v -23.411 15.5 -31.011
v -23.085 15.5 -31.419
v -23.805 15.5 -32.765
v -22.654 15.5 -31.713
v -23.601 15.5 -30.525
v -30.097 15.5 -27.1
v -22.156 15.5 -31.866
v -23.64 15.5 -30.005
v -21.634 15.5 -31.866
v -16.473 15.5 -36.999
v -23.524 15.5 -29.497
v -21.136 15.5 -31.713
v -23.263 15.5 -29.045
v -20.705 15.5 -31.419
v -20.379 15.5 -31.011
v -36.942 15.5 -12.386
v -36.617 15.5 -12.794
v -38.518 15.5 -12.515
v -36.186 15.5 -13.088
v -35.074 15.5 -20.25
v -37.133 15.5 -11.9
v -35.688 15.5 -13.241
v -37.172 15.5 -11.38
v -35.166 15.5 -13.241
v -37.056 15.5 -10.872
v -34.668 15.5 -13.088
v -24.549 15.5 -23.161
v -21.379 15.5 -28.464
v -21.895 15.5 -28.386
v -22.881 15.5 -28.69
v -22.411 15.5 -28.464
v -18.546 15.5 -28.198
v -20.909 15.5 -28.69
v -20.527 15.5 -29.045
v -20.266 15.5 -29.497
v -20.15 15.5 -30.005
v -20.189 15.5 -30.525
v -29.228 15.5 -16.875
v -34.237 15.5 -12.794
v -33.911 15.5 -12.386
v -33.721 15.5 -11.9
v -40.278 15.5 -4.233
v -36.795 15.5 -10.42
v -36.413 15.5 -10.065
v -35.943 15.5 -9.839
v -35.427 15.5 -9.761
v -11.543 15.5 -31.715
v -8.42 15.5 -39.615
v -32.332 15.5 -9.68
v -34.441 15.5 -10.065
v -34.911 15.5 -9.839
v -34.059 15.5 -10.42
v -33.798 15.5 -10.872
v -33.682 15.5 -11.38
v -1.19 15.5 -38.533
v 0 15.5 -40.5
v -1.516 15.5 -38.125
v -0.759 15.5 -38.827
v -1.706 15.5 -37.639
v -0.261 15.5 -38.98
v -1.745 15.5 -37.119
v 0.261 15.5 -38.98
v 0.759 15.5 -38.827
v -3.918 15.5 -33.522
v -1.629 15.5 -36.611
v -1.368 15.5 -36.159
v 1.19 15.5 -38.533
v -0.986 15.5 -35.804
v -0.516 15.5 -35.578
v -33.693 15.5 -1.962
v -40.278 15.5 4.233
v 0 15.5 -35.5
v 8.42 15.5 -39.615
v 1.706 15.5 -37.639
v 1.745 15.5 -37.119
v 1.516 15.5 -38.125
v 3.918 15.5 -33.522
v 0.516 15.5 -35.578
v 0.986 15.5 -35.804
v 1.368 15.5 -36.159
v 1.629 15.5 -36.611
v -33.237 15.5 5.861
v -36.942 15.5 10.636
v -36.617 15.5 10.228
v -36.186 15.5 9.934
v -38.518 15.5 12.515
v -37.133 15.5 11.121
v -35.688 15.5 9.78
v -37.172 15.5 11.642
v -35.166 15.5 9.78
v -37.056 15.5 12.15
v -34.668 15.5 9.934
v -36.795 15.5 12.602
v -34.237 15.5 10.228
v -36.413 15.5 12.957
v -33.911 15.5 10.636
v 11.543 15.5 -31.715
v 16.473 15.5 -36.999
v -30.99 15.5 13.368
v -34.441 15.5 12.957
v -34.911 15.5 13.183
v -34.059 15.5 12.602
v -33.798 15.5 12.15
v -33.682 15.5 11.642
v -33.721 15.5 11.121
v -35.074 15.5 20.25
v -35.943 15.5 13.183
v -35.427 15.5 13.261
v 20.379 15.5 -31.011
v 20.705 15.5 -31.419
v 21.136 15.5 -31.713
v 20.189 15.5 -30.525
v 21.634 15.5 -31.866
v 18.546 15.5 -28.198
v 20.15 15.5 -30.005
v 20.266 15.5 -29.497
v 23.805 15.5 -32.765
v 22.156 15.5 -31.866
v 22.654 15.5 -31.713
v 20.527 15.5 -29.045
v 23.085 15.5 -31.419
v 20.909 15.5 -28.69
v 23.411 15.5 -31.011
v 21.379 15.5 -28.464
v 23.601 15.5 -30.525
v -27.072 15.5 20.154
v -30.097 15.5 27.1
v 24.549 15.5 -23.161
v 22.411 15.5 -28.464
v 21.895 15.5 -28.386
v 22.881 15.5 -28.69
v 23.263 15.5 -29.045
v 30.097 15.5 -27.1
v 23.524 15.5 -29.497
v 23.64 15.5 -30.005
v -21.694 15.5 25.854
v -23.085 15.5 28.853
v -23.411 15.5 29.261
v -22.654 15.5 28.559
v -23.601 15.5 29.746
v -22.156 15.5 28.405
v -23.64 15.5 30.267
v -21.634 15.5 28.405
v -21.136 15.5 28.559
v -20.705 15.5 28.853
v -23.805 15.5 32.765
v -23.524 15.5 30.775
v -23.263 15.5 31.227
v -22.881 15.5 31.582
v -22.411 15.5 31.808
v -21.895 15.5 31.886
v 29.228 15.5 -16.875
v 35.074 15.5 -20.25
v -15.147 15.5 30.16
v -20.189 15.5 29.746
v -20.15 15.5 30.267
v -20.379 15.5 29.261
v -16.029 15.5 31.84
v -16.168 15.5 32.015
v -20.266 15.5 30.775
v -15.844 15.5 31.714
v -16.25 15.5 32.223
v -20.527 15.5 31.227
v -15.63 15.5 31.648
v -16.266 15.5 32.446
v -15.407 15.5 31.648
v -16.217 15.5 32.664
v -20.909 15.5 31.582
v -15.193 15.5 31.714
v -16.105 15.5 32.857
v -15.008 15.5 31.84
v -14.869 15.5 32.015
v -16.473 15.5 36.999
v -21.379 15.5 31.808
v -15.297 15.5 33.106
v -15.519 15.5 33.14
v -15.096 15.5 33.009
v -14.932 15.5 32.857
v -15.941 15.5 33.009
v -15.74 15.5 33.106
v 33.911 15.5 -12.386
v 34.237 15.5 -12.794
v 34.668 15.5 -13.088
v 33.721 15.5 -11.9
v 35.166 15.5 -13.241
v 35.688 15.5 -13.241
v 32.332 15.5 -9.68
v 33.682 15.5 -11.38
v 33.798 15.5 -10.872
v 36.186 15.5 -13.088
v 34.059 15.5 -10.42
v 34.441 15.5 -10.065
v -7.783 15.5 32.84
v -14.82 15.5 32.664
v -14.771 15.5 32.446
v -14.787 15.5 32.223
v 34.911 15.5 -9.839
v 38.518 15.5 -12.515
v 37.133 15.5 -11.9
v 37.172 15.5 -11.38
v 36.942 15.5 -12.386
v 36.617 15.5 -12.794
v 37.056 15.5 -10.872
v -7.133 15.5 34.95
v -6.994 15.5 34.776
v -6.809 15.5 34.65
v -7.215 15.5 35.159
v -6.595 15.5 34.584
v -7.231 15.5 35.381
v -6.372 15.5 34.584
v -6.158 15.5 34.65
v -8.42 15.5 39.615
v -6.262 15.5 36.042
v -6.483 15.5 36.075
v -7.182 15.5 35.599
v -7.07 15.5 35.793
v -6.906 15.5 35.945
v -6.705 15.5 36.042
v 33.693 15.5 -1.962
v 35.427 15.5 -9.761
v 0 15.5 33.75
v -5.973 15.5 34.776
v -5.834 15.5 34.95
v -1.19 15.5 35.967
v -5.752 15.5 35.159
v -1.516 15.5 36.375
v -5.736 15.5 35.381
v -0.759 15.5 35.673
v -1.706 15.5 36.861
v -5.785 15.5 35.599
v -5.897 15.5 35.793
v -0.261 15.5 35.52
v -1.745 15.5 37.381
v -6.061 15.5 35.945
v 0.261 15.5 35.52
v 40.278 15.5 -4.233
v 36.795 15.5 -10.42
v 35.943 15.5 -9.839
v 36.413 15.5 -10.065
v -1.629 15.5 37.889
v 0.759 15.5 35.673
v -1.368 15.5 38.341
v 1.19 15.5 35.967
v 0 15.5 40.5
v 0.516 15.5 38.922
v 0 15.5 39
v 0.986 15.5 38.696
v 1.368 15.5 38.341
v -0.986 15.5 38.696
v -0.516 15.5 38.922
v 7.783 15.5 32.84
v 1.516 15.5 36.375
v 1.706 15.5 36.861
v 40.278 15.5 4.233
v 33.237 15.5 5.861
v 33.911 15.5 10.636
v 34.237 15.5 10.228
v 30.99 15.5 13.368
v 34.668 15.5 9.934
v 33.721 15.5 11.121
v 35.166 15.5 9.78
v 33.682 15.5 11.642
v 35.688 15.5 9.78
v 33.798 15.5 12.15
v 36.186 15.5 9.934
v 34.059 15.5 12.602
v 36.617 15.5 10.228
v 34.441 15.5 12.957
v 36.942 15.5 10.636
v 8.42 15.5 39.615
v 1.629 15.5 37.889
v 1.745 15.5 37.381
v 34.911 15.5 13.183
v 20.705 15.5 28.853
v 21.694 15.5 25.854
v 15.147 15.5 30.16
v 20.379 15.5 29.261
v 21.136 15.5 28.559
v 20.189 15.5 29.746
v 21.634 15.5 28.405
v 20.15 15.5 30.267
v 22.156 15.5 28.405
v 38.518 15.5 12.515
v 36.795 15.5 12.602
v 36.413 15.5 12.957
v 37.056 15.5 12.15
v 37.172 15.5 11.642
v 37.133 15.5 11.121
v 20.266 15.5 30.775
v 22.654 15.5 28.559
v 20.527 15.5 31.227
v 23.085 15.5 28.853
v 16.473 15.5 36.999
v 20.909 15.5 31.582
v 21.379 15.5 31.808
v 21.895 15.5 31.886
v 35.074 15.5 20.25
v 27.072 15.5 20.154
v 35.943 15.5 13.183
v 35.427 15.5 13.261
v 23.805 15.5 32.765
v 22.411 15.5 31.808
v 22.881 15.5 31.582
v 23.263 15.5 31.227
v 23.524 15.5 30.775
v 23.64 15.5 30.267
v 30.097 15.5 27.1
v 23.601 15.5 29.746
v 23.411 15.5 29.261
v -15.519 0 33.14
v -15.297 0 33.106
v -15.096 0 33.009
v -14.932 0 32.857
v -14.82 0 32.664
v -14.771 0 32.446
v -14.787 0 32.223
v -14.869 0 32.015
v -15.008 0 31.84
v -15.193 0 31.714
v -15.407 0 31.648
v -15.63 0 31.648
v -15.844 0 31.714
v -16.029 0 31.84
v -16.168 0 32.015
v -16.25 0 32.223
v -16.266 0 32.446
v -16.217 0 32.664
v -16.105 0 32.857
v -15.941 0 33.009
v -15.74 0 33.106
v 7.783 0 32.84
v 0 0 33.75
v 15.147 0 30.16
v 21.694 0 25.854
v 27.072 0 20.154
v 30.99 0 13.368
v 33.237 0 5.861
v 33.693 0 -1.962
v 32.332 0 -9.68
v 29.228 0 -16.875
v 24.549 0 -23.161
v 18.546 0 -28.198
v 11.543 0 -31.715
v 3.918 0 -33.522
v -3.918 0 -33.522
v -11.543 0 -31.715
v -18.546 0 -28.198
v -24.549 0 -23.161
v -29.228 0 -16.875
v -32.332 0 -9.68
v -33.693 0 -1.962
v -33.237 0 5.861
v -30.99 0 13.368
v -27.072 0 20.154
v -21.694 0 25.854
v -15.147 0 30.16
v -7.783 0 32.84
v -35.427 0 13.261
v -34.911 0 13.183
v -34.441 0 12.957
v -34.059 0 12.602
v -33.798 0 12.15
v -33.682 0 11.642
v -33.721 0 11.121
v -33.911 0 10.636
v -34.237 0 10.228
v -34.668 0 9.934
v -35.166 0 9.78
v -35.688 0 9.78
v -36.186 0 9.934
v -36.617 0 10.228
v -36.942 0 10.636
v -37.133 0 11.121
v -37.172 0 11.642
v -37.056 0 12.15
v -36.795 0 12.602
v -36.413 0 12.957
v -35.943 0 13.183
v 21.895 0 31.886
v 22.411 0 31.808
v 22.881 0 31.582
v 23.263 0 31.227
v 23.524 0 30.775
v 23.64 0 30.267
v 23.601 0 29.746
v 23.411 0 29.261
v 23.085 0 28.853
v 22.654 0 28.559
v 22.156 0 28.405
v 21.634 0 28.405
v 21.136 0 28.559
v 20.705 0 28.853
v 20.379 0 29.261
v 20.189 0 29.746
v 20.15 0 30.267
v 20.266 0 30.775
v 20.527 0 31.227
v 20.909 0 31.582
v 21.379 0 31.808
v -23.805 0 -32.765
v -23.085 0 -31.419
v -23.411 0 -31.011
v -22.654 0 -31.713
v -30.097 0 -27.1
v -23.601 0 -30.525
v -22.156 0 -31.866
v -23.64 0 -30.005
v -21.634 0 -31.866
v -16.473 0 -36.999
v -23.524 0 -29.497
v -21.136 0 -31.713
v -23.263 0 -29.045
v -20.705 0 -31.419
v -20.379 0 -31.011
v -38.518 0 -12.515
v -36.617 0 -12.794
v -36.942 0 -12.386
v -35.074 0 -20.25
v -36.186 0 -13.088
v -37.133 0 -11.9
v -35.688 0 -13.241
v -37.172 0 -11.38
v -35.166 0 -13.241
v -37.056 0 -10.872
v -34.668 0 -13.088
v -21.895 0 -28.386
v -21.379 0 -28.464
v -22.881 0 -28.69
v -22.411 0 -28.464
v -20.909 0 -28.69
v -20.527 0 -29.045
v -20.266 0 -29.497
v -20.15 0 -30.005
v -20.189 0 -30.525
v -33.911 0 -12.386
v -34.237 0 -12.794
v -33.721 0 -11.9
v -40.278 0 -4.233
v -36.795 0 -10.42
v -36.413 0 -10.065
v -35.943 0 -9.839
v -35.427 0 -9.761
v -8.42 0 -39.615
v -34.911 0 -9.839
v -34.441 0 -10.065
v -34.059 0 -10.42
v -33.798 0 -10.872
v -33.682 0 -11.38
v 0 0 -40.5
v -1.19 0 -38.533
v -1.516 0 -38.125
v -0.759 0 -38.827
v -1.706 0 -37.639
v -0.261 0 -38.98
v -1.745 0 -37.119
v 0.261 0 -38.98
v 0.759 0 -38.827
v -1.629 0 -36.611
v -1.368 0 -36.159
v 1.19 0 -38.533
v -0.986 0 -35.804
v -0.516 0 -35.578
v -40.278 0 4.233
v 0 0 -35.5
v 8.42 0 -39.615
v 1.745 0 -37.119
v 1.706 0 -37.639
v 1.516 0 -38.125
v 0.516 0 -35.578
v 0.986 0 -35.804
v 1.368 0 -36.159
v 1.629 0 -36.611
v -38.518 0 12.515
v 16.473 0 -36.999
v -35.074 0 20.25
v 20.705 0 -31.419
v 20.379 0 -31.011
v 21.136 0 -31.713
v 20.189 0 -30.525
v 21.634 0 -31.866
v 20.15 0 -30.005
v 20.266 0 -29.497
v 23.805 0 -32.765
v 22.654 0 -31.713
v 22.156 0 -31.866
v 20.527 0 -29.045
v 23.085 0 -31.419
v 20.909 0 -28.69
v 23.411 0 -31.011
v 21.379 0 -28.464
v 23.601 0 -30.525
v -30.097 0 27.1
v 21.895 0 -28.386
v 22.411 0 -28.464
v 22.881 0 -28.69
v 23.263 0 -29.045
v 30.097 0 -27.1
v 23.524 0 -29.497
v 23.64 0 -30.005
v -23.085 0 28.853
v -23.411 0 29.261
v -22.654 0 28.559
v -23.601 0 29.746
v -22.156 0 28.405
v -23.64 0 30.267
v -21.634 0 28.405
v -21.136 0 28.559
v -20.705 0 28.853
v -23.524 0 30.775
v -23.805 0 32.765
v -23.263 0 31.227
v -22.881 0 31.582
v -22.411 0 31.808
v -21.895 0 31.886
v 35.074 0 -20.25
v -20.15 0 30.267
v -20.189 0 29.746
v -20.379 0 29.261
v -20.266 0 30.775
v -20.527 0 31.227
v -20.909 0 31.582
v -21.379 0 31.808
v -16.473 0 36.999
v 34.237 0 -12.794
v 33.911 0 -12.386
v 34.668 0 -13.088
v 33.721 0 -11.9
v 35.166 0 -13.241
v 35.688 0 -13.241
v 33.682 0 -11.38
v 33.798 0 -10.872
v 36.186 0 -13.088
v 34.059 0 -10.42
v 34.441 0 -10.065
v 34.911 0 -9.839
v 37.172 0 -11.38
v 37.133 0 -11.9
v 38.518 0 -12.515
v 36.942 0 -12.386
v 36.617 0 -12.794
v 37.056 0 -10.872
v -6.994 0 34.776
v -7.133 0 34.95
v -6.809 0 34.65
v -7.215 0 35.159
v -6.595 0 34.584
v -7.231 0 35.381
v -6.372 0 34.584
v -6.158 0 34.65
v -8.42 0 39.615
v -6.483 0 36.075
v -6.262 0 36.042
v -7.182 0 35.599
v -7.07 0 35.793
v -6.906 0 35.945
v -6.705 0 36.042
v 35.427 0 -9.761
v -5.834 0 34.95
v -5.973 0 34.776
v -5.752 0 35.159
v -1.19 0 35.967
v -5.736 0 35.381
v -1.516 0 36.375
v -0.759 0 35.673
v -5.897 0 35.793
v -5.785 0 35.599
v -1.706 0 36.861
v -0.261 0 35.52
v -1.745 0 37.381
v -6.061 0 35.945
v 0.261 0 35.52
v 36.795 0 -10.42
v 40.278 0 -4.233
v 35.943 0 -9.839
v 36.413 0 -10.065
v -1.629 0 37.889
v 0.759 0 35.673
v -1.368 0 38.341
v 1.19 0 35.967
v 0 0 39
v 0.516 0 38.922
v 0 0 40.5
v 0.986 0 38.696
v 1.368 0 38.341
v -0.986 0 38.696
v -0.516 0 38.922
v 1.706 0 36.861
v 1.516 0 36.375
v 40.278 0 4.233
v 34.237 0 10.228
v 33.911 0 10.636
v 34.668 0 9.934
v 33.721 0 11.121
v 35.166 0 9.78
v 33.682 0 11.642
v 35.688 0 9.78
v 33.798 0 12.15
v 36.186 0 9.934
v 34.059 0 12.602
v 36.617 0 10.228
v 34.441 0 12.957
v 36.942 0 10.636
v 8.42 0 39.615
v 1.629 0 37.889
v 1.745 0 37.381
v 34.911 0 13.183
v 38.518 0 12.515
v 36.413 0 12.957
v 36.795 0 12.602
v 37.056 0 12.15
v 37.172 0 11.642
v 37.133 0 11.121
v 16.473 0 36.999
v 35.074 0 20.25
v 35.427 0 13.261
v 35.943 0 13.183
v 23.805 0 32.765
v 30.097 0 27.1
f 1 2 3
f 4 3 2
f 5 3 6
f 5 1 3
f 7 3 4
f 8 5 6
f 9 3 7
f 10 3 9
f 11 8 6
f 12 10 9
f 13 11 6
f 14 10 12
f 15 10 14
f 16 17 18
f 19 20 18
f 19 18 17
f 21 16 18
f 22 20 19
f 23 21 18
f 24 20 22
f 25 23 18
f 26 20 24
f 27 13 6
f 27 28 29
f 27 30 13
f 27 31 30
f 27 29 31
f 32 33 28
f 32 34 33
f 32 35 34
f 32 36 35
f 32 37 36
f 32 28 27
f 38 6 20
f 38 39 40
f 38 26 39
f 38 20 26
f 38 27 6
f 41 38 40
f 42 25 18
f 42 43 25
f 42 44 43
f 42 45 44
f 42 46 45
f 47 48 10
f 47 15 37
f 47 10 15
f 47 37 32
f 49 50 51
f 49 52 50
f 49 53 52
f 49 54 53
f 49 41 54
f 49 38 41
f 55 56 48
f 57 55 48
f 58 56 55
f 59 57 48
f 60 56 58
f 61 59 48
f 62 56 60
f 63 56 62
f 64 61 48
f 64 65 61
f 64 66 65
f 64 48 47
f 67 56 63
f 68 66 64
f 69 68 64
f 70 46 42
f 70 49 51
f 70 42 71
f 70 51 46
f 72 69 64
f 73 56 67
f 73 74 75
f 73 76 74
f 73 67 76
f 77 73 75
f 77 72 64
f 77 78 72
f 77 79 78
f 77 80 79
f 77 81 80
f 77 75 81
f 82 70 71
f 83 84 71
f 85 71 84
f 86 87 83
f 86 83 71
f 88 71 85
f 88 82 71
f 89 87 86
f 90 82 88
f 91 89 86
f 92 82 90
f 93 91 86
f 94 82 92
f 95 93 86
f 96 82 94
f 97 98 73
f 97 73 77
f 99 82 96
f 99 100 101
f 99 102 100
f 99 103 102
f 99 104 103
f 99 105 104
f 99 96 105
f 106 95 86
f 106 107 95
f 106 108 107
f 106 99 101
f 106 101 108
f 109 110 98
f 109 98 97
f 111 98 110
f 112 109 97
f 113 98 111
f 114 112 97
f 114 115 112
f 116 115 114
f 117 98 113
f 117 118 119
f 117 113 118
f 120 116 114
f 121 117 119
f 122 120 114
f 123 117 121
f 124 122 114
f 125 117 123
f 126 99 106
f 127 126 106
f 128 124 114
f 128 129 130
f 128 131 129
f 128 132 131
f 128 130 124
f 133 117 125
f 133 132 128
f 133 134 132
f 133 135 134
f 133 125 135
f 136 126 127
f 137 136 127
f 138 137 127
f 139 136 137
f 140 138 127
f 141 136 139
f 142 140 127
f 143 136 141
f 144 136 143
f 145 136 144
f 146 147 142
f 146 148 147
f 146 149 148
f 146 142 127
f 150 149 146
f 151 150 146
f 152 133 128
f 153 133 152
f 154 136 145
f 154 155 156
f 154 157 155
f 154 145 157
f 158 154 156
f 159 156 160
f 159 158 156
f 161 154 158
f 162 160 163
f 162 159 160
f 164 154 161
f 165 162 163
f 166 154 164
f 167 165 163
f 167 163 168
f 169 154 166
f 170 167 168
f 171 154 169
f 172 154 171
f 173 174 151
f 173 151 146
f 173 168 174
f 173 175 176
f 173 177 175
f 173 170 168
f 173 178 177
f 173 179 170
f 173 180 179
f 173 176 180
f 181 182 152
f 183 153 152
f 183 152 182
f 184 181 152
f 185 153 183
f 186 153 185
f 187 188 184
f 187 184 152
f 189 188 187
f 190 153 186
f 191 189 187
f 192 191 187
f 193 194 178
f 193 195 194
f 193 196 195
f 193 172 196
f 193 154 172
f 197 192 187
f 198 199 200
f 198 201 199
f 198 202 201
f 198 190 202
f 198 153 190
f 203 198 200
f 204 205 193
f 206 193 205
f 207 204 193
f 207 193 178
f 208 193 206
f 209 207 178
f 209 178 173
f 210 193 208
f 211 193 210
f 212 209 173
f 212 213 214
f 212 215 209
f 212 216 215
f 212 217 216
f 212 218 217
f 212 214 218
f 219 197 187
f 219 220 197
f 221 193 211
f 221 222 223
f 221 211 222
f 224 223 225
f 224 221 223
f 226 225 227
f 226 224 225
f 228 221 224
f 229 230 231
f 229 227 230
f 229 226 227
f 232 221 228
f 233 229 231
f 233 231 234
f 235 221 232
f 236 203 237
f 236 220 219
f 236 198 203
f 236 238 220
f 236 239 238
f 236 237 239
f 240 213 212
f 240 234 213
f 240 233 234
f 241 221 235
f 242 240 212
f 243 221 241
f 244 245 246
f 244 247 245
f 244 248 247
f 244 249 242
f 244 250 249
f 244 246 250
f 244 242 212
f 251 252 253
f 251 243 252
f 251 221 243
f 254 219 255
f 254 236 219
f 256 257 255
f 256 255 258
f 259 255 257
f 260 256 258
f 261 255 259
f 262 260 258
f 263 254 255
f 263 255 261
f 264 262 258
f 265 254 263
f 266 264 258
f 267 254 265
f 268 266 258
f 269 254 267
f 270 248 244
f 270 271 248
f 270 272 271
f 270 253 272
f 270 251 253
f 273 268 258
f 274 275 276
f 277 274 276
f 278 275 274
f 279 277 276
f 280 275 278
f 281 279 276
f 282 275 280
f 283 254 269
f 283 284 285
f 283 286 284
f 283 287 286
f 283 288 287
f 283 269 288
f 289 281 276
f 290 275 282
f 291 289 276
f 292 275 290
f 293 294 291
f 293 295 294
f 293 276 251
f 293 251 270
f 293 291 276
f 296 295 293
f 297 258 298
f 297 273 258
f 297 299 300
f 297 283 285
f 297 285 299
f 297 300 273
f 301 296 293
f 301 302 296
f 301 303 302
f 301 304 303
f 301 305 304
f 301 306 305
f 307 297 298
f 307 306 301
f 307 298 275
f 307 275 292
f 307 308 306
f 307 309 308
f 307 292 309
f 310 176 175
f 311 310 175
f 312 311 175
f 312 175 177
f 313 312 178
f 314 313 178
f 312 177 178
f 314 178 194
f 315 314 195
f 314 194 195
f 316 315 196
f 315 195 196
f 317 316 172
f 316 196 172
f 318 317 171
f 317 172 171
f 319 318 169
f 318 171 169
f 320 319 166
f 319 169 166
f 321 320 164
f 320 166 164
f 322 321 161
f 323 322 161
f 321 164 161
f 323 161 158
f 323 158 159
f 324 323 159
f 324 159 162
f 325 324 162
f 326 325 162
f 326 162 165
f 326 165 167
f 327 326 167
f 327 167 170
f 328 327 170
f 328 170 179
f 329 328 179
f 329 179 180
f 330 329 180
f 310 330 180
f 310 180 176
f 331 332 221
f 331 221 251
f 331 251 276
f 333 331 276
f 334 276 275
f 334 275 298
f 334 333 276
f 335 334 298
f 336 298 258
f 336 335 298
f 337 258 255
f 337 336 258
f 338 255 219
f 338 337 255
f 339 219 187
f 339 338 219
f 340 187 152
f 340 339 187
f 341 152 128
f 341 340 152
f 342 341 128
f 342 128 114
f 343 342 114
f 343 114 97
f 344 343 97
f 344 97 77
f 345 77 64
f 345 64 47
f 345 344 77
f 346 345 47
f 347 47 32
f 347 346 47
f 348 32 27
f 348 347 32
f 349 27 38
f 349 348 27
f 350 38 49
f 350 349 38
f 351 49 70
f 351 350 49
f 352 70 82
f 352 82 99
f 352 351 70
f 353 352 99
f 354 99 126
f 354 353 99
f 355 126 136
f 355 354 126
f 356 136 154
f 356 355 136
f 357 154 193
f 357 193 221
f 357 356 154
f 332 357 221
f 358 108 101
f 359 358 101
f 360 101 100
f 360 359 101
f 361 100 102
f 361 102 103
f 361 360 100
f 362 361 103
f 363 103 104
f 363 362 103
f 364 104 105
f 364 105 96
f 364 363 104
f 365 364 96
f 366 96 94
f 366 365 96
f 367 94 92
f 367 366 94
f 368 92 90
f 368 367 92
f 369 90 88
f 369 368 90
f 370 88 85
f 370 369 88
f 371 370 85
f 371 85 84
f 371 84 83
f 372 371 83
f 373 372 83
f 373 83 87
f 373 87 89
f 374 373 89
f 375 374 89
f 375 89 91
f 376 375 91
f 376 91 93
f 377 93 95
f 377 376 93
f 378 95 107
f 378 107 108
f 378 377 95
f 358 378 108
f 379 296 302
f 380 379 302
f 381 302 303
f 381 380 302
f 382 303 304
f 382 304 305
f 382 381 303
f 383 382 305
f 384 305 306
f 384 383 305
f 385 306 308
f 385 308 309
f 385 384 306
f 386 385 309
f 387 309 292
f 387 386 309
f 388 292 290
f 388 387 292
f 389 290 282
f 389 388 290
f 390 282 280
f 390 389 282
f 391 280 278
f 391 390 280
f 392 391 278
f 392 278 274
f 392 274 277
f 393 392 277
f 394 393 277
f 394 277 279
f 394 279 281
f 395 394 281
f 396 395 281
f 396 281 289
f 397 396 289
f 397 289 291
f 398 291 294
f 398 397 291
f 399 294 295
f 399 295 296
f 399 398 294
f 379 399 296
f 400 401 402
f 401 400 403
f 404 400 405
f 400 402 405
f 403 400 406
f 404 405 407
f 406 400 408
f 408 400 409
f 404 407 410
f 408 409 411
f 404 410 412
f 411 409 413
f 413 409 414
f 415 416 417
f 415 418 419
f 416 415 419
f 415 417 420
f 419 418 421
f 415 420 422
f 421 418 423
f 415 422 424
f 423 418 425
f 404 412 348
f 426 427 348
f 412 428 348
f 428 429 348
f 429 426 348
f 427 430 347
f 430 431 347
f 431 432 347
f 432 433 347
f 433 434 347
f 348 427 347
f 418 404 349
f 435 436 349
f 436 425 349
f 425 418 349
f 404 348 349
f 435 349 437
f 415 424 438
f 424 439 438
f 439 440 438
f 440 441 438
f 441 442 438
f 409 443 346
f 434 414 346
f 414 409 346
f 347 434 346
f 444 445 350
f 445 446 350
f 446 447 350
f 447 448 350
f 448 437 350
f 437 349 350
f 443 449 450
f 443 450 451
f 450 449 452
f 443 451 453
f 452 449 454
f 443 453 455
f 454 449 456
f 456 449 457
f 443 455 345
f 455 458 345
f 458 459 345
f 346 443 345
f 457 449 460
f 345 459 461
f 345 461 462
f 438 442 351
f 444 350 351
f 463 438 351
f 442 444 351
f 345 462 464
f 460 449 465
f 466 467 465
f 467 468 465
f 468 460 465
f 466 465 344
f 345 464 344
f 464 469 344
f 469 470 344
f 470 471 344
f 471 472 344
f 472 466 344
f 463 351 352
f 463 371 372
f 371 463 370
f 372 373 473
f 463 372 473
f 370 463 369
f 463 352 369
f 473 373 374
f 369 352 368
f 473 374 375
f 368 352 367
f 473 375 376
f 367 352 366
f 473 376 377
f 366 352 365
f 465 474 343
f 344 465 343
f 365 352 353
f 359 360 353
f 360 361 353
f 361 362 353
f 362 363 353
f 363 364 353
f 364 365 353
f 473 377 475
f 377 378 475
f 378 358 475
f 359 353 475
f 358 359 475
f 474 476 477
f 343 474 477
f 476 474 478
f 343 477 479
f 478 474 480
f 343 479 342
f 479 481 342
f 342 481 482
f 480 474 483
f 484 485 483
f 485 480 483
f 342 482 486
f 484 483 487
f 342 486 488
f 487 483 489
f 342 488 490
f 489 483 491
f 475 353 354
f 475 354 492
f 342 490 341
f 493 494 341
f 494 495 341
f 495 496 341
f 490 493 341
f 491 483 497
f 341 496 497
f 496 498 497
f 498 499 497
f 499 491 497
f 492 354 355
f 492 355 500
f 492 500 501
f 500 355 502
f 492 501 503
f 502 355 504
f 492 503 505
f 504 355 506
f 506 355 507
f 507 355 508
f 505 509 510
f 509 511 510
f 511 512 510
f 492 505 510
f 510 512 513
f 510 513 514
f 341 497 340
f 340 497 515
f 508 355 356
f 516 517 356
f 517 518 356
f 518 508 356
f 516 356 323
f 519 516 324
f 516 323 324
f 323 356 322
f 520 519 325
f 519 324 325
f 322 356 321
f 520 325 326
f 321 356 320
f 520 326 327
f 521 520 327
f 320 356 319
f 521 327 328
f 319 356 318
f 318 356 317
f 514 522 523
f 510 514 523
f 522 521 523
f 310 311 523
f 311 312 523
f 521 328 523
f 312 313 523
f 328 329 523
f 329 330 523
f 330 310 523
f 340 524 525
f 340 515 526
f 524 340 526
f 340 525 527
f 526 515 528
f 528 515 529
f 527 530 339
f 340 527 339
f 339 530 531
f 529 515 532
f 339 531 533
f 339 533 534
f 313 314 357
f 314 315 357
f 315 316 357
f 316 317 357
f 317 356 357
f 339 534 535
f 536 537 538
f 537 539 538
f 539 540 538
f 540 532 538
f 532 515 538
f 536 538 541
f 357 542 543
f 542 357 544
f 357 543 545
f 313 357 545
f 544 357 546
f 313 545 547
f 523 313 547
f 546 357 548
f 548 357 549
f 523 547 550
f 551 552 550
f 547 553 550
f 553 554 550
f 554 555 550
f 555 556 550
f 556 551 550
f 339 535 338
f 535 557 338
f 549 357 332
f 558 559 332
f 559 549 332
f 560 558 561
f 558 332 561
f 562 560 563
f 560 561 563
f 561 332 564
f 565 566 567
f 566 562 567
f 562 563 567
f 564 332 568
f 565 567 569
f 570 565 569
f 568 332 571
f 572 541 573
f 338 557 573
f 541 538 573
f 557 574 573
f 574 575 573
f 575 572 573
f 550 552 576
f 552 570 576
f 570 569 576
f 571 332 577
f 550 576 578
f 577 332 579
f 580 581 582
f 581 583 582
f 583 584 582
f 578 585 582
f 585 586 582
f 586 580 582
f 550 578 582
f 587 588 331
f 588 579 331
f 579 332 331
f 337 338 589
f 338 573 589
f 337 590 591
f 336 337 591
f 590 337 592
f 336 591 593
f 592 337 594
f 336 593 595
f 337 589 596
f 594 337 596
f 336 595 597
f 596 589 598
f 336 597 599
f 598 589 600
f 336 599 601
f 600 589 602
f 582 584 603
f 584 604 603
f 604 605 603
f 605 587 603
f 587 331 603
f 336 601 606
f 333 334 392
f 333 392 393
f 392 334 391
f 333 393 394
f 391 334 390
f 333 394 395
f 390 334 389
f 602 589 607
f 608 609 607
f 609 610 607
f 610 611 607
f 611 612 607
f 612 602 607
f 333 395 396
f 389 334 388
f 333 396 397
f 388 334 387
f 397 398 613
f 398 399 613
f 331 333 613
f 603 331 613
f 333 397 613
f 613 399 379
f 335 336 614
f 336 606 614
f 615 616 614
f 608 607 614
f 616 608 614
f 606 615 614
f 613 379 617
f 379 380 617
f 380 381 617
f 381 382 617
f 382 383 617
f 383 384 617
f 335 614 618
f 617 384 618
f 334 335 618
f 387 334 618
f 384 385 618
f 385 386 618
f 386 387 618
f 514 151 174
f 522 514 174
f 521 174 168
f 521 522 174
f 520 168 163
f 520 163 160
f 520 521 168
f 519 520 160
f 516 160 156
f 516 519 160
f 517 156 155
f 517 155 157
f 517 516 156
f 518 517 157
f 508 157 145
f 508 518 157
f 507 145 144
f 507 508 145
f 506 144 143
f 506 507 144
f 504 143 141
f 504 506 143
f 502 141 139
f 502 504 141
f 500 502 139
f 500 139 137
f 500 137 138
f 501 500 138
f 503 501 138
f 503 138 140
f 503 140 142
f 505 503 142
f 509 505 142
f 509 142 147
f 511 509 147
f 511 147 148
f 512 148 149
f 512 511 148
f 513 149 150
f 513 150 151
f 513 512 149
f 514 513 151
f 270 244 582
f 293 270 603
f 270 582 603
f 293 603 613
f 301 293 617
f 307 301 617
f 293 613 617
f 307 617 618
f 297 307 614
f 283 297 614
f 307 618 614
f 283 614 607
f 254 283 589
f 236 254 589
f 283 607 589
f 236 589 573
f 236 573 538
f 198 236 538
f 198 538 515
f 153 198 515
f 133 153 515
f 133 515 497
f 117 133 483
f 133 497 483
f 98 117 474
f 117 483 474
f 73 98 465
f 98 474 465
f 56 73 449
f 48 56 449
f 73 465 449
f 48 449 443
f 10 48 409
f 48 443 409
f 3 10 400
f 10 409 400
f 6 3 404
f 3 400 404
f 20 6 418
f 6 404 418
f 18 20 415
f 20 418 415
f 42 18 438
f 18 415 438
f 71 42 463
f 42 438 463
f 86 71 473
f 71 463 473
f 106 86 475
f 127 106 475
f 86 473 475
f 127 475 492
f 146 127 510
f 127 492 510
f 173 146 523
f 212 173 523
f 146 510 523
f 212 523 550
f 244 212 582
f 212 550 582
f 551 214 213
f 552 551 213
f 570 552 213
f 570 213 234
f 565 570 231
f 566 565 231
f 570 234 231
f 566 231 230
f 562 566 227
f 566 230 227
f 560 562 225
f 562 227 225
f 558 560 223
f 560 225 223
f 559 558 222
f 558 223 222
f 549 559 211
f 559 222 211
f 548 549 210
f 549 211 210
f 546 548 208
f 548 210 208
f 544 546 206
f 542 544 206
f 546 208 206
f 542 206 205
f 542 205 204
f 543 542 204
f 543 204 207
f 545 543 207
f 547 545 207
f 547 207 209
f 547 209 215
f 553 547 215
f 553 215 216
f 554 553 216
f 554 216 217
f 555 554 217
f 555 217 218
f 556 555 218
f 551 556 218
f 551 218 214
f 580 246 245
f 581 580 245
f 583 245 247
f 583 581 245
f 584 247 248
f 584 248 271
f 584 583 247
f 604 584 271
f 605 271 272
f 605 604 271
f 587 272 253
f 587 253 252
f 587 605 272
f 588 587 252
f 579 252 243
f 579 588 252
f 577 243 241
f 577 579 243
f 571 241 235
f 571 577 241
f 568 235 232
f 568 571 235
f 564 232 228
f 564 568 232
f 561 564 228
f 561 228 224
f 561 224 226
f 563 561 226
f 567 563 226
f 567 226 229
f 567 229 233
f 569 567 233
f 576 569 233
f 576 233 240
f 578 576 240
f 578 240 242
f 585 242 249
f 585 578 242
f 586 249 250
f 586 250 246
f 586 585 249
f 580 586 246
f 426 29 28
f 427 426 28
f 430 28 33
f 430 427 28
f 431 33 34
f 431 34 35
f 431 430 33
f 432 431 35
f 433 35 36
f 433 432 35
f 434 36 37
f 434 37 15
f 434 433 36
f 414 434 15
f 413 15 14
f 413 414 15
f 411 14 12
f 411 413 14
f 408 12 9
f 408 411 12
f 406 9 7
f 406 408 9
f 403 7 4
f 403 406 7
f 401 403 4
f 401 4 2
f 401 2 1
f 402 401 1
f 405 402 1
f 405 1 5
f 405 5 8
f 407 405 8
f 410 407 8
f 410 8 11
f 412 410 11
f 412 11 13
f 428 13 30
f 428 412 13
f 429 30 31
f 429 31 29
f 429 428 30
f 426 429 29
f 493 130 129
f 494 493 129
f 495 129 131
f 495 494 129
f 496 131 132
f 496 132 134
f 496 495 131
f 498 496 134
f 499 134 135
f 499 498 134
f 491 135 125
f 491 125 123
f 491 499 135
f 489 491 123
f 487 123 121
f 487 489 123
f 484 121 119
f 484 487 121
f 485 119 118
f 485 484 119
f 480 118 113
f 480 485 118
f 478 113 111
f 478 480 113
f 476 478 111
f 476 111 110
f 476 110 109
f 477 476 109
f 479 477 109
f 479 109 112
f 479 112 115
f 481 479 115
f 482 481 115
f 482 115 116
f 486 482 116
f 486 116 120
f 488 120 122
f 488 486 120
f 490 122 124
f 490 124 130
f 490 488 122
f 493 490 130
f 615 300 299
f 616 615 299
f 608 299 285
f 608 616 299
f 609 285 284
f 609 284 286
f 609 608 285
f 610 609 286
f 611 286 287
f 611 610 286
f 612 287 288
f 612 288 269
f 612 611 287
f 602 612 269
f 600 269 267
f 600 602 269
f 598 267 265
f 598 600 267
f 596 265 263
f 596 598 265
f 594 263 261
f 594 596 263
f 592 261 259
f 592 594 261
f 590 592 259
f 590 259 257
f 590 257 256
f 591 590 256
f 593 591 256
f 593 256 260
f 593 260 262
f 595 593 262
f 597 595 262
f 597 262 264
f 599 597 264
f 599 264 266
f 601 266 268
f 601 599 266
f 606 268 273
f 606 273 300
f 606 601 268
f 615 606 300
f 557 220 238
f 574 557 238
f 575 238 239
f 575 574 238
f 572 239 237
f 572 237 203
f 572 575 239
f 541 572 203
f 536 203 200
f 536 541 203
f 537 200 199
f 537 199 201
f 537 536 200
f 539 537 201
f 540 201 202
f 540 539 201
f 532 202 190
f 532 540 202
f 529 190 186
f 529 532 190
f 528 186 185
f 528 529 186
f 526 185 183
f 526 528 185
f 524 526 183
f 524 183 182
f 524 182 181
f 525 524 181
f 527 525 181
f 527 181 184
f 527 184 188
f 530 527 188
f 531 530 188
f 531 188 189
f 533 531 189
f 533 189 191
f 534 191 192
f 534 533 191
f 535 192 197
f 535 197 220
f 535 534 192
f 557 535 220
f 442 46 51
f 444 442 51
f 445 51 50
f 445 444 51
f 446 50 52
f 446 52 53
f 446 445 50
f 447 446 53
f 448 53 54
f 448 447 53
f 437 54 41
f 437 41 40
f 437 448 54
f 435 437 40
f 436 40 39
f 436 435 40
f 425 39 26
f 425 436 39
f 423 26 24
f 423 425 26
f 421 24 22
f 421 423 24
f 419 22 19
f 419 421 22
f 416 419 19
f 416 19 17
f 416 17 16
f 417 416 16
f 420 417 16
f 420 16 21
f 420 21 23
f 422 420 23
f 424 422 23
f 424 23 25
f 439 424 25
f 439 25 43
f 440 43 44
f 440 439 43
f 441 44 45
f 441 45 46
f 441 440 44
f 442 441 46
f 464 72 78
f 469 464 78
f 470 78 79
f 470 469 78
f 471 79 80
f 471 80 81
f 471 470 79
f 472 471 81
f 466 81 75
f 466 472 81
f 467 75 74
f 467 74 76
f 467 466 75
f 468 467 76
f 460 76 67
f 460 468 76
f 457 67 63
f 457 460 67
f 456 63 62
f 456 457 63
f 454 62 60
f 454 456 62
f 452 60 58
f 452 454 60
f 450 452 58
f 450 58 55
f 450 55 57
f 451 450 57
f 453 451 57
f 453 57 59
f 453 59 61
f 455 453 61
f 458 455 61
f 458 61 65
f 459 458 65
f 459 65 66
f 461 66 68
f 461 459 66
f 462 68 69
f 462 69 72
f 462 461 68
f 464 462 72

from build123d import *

# Parameters (mm, degrees)
SKETCH1_R           = 40.5
SKETCH1_R_2         = 1.75
SKETCH1_R_3         = 33.75
BOSS_EXTRUDE1_DEPTH = 15.5
SKETCH2_R           = 0.75
CUT_EXTRUDE1_DEPTH  = 60.335908184


with BuildPart() as part:
    # Sketch1 → Boss-Extrude1 (new body)
    with BuildSketch(Plane(origin=(0, 0, 0), x_dir=(1, 0, 0), z_dir=(0, 1, 0))):
        with Locations(Location((0, 0, 0), (0, 0, 270))):
            Circle(SKETCH1_R)
        with Locations(Location((0, 37.25, 0), (0, 0, 270))):
            Circle(SKETCH1_R_2, mode=Mode.SUBTRACT)
        with Locations(Location((21.895000648, 30.13588304, 0), (0, 0, 270))):
            Circle(SKETCH1_R_2, mode=Mode.SUBTRACT)
        with Locations(Location((35.426855232, 11.51088304, 0), (0, 0, 270))):
            Circle(SKETCH1_R_2, mode=Mode.SUBTRACT)
        with Locations(Location((35.426855232, -11.51088304, 0), (0, 0, 270))):
            Circle(SKETCH1_R_2, mode=Mode.SUBTRACT)
        with Locations(Location((21.895000648, -30.13588304, 0), (0, 0, 270))):
            Circle(SKETCH1_R_2, mode=Mode.SUBTRACT)
        with Locations(Location((0, -37.25, 0), (0, 0, 270))):
            Circle(SKETCH1_R_2, mode=Mode.SUBTRACT)
        with Locations(Location((-21.895000648, -30.13588304, 0), (0, 0, 270))):
            Circle(SKETCH1_R_2, mode=Mode.SUBTRACT)
        with Locations(Location((-35.426855232, -11.51088304, 0), (0, 0, 270))):
            Circle(SKETCH1_R_2, mode=Mode.SUBTRACT)
        with Locations(Location((-35.426855232, 11.51088304, 0), (0, 0, 270))):
            Circle(SKETCH1_R_2, mode=Mode.SUBTRACT)
        with Locations(Location((-21.895000648, 30.13588304, 0), (0, 0, 270))):
            Circle(SKETCH1_R_2, mode=Mode.SUBTRACT)
        with Locations(Location((0, 0, 0), (0, 0, 270))):
            Circle(SKETCH1_R_3, mode=Mode.SUBTRACT)
    extrude(amount=BOSS_EXTRUDE1_DEPTH)

    # Sketch2 → Cut-Extrude1 (cut, through all)
    with BuildSketch(Plane(origin=(0, 15.5, 0), x_dir=(1, 0, 0), z_dir=(0, 1, 0))):
        with Locations(Location((-6.483486619, -35.325442924, 0), (0, 0, 270))):
            Circle(SKETCH2_R)
        with Locations(Location((-15.518523524, -32.389781477, 0), (0, 0, 270))):
            Circle(SKETCH2_R)
    extrude(amount=-CUT_EXTRUDE1_DEPTH, mode=Mode.SUBTRACT)


solid = part.part
